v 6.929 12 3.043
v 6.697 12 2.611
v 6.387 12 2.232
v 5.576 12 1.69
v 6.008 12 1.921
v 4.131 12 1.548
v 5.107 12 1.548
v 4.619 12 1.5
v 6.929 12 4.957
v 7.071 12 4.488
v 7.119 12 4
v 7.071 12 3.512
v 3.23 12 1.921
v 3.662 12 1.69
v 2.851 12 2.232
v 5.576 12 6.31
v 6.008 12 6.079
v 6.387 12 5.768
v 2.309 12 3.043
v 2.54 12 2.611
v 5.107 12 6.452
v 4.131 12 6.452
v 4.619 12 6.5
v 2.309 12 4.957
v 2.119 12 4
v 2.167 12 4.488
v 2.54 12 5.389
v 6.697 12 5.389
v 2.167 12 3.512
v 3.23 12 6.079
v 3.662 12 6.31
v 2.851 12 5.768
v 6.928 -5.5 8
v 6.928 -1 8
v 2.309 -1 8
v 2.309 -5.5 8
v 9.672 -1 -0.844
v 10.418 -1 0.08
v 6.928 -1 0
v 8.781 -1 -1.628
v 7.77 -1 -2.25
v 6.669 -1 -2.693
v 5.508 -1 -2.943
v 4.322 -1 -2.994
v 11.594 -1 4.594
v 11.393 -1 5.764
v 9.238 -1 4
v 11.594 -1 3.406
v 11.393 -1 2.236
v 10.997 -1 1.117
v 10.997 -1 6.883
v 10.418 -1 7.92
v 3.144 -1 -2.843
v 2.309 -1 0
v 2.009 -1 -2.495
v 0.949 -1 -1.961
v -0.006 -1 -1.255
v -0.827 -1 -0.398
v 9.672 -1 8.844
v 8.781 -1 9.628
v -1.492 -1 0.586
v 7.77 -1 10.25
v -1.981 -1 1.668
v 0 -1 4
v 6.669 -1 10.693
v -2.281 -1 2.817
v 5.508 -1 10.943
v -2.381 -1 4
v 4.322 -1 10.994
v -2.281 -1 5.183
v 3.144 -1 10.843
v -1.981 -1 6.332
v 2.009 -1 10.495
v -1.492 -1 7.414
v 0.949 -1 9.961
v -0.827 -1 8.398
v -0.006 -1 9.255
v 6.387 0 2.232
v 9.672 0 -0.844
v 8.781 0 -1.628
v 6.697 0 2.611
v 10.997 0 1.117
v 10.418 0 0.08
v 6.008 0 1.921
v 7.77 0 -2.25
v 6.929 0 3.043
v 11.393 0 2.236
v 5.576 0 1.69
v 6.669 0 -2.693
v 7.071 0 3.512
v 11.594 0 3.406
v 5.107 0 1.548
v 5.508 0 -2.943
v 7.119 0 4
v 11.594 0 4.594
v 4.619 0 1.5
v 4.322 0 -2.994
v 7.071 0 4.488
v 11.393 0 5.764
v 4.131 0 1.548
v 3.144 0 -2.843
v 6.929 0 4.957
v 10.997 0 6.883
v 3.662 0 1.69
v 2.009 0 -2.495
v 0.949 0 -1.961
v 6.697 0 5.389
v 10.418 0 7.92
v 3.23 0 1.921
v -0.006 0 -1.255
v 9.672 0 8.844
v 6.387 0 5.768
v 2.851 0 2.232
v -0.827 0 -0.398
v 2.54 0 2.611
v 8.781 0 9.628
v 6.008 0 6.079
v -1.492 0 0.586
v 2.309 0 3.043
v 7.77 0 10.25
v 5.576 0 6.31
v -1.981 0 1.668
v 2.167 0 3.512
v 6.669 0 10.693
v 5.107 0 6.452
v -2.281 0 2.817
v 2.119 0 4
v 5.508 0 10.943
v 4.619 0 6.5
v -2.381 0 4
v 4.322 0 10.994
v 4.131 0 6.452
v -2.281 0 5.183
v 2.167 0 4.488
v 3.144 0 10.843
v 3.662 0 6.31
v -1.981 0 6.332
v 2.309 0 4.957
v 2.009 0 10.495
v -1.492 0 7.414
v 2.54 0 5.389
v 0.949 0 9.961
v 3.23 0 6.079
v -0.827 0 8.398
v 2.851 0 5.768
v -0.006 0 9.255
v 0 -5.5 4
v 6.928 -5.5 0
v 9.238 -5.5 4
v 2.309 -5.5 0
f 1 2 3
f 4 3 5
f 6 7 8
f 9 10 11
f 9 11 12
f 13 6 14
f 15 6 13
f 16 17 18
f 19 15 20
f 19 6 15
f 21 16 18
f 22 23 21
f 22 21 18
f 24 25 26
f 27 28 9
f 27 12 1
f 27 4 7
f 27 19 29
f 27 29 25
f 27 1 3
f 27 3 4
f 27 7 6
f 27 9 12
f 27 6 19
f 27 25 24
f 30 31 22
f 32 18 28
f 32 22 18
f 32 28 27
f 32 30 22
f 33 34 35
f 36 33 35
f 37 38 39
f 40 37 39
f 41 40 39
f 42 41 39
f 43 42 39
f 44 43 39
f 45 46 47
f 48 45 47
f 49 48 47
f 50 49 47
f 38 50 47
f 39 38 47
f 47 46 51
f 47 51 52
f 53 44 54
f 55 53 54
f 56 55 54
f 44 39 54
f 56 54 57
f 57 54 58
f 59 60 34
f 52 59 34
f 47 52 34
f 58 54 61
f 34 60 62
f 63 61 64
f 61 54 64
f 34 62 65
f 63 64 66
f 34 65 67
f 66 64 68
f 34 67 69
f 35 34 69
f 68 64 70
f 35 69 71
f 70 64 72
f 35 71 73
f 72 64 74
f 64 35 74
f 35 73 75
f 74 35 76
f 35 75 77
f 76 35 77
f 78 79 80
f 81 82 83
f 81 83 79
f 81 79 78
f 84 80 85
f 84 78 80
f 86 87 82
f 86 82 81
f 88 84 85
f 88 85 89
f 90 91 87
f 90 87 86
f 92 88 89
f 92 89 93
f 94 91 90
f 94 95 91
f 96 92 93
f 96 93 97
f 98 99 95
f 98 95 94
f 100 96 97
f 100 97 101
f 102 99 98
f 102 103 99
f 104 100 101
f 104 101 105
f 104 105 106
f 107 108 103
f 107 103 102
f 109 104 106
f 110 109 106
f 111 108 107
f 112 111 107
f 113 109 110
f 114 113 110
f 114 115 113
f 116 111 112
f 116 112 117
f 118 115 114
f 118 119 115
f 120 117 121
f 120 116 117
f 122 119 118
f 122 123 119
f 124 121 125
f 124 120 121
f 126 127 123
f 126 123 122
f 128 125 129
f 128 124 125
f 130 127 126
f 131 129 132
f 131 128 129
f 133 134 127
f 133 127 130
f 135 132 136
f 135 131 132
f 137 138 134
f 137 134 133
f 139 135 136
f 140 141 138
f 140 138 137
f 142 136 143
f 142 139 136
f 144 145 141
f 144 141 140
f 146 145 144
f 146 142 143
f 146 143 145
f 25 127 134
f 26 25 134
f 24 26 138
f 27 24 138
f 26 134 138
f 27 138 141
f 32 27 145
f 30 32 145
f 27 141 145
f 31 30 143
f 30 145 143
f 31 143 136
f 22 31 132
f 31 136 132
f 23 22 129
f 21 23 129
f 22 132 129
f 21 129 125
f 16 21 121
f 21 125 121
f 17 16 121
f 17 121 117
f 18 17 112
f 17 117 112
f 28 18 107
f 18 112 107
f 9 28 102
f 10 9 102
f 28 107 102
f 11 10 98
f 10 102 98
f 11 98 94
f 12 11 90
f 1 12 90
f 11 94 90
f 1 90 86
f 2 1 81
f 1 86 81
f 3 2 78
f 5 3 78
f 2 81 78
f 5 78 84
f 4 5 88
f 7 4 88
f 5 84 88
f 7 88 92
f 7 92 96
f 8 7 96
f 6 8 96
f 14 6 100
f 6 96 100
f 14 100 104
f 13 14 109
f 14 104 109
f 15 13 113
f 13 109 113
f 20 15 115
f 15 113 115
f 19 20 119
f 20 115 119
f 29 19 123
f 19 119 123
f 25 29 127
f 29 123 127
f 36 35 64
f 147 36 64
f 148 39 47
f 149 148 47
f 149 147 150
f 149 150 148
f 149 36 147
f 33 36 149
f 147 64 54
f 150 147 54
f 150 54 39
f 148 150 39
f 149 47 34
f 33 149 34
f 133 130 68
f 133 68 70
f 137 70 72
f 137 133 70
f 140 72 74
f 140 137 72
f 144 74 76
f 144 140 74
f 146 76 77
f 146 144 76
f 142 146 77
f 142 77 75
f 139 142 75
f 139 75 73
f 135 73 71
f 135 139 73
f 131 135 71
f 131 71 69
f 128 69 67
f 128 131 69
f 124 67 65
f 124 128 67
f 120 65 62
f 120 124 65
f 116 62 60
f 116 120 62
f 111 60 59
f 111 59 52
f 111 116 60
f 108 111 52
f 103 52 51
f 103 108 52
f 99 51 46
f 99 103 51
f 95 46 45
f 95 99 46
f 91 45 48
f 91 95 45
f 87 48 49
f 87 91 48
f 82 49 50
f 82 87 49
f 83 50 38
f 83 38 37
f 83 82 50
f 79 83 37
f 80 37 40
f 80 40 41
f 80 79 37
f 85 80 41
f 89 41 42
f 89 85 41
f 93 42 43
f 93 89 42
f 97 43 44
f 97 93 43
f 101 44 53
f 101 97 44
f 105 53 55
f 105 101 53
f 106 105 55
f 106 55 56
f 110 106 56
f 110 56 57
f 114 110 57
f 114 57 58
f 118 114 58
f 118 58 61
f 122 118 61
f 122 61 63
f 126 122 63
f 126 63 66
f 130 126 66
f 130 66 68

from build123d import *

# Parameters (mm, degrees)
F1_DEPTH = 5.5
F2_R     = 7
F3_DEPTH = 1
F4_R     = 2.5
F5_DEPTH = 12


with BuildPart() as f1:
    # F0 (on Front) → F1 (new body)
    with BuildSketch(Plane.XZ):
        Polygon((0, 4), (2.309401, 0), (6.928203, 0), (9.237604, 4), (6.928203, 8), (2.309401, 8), align=None)
    extrude(amount=F1_DEPTH)

    # F2 (on face) → F3 (join)
    with BuildSketch(Plane(origin=(0, 0, 0), x_dir=(-1, 0, 0), z_dir=(0, 1, 0))):
        with Locations((-4.618802, 4)):
            Circle(F2_R)
        Polygon((-2.309401, 8), (0, 4), (-2.309401, 0), (-6.928203, 0), (-9.237604, 4), (-6.928203, 8), align=None, mode=Mode.SUBTRACT)
    extrude(amount=-F3_DEPTH)

    # F4 (on face) → F5 (join)
    with BuildSketch(Plane(origin=(0, 0, 0), x_dir=(-1, 0, 0), z_dir=(0, 1, 0))):
        with Locations((-4.618802, 4)):
            Circle(F4_R)
    extrude(amount=F5_DEPTH)


solid = f1.part
